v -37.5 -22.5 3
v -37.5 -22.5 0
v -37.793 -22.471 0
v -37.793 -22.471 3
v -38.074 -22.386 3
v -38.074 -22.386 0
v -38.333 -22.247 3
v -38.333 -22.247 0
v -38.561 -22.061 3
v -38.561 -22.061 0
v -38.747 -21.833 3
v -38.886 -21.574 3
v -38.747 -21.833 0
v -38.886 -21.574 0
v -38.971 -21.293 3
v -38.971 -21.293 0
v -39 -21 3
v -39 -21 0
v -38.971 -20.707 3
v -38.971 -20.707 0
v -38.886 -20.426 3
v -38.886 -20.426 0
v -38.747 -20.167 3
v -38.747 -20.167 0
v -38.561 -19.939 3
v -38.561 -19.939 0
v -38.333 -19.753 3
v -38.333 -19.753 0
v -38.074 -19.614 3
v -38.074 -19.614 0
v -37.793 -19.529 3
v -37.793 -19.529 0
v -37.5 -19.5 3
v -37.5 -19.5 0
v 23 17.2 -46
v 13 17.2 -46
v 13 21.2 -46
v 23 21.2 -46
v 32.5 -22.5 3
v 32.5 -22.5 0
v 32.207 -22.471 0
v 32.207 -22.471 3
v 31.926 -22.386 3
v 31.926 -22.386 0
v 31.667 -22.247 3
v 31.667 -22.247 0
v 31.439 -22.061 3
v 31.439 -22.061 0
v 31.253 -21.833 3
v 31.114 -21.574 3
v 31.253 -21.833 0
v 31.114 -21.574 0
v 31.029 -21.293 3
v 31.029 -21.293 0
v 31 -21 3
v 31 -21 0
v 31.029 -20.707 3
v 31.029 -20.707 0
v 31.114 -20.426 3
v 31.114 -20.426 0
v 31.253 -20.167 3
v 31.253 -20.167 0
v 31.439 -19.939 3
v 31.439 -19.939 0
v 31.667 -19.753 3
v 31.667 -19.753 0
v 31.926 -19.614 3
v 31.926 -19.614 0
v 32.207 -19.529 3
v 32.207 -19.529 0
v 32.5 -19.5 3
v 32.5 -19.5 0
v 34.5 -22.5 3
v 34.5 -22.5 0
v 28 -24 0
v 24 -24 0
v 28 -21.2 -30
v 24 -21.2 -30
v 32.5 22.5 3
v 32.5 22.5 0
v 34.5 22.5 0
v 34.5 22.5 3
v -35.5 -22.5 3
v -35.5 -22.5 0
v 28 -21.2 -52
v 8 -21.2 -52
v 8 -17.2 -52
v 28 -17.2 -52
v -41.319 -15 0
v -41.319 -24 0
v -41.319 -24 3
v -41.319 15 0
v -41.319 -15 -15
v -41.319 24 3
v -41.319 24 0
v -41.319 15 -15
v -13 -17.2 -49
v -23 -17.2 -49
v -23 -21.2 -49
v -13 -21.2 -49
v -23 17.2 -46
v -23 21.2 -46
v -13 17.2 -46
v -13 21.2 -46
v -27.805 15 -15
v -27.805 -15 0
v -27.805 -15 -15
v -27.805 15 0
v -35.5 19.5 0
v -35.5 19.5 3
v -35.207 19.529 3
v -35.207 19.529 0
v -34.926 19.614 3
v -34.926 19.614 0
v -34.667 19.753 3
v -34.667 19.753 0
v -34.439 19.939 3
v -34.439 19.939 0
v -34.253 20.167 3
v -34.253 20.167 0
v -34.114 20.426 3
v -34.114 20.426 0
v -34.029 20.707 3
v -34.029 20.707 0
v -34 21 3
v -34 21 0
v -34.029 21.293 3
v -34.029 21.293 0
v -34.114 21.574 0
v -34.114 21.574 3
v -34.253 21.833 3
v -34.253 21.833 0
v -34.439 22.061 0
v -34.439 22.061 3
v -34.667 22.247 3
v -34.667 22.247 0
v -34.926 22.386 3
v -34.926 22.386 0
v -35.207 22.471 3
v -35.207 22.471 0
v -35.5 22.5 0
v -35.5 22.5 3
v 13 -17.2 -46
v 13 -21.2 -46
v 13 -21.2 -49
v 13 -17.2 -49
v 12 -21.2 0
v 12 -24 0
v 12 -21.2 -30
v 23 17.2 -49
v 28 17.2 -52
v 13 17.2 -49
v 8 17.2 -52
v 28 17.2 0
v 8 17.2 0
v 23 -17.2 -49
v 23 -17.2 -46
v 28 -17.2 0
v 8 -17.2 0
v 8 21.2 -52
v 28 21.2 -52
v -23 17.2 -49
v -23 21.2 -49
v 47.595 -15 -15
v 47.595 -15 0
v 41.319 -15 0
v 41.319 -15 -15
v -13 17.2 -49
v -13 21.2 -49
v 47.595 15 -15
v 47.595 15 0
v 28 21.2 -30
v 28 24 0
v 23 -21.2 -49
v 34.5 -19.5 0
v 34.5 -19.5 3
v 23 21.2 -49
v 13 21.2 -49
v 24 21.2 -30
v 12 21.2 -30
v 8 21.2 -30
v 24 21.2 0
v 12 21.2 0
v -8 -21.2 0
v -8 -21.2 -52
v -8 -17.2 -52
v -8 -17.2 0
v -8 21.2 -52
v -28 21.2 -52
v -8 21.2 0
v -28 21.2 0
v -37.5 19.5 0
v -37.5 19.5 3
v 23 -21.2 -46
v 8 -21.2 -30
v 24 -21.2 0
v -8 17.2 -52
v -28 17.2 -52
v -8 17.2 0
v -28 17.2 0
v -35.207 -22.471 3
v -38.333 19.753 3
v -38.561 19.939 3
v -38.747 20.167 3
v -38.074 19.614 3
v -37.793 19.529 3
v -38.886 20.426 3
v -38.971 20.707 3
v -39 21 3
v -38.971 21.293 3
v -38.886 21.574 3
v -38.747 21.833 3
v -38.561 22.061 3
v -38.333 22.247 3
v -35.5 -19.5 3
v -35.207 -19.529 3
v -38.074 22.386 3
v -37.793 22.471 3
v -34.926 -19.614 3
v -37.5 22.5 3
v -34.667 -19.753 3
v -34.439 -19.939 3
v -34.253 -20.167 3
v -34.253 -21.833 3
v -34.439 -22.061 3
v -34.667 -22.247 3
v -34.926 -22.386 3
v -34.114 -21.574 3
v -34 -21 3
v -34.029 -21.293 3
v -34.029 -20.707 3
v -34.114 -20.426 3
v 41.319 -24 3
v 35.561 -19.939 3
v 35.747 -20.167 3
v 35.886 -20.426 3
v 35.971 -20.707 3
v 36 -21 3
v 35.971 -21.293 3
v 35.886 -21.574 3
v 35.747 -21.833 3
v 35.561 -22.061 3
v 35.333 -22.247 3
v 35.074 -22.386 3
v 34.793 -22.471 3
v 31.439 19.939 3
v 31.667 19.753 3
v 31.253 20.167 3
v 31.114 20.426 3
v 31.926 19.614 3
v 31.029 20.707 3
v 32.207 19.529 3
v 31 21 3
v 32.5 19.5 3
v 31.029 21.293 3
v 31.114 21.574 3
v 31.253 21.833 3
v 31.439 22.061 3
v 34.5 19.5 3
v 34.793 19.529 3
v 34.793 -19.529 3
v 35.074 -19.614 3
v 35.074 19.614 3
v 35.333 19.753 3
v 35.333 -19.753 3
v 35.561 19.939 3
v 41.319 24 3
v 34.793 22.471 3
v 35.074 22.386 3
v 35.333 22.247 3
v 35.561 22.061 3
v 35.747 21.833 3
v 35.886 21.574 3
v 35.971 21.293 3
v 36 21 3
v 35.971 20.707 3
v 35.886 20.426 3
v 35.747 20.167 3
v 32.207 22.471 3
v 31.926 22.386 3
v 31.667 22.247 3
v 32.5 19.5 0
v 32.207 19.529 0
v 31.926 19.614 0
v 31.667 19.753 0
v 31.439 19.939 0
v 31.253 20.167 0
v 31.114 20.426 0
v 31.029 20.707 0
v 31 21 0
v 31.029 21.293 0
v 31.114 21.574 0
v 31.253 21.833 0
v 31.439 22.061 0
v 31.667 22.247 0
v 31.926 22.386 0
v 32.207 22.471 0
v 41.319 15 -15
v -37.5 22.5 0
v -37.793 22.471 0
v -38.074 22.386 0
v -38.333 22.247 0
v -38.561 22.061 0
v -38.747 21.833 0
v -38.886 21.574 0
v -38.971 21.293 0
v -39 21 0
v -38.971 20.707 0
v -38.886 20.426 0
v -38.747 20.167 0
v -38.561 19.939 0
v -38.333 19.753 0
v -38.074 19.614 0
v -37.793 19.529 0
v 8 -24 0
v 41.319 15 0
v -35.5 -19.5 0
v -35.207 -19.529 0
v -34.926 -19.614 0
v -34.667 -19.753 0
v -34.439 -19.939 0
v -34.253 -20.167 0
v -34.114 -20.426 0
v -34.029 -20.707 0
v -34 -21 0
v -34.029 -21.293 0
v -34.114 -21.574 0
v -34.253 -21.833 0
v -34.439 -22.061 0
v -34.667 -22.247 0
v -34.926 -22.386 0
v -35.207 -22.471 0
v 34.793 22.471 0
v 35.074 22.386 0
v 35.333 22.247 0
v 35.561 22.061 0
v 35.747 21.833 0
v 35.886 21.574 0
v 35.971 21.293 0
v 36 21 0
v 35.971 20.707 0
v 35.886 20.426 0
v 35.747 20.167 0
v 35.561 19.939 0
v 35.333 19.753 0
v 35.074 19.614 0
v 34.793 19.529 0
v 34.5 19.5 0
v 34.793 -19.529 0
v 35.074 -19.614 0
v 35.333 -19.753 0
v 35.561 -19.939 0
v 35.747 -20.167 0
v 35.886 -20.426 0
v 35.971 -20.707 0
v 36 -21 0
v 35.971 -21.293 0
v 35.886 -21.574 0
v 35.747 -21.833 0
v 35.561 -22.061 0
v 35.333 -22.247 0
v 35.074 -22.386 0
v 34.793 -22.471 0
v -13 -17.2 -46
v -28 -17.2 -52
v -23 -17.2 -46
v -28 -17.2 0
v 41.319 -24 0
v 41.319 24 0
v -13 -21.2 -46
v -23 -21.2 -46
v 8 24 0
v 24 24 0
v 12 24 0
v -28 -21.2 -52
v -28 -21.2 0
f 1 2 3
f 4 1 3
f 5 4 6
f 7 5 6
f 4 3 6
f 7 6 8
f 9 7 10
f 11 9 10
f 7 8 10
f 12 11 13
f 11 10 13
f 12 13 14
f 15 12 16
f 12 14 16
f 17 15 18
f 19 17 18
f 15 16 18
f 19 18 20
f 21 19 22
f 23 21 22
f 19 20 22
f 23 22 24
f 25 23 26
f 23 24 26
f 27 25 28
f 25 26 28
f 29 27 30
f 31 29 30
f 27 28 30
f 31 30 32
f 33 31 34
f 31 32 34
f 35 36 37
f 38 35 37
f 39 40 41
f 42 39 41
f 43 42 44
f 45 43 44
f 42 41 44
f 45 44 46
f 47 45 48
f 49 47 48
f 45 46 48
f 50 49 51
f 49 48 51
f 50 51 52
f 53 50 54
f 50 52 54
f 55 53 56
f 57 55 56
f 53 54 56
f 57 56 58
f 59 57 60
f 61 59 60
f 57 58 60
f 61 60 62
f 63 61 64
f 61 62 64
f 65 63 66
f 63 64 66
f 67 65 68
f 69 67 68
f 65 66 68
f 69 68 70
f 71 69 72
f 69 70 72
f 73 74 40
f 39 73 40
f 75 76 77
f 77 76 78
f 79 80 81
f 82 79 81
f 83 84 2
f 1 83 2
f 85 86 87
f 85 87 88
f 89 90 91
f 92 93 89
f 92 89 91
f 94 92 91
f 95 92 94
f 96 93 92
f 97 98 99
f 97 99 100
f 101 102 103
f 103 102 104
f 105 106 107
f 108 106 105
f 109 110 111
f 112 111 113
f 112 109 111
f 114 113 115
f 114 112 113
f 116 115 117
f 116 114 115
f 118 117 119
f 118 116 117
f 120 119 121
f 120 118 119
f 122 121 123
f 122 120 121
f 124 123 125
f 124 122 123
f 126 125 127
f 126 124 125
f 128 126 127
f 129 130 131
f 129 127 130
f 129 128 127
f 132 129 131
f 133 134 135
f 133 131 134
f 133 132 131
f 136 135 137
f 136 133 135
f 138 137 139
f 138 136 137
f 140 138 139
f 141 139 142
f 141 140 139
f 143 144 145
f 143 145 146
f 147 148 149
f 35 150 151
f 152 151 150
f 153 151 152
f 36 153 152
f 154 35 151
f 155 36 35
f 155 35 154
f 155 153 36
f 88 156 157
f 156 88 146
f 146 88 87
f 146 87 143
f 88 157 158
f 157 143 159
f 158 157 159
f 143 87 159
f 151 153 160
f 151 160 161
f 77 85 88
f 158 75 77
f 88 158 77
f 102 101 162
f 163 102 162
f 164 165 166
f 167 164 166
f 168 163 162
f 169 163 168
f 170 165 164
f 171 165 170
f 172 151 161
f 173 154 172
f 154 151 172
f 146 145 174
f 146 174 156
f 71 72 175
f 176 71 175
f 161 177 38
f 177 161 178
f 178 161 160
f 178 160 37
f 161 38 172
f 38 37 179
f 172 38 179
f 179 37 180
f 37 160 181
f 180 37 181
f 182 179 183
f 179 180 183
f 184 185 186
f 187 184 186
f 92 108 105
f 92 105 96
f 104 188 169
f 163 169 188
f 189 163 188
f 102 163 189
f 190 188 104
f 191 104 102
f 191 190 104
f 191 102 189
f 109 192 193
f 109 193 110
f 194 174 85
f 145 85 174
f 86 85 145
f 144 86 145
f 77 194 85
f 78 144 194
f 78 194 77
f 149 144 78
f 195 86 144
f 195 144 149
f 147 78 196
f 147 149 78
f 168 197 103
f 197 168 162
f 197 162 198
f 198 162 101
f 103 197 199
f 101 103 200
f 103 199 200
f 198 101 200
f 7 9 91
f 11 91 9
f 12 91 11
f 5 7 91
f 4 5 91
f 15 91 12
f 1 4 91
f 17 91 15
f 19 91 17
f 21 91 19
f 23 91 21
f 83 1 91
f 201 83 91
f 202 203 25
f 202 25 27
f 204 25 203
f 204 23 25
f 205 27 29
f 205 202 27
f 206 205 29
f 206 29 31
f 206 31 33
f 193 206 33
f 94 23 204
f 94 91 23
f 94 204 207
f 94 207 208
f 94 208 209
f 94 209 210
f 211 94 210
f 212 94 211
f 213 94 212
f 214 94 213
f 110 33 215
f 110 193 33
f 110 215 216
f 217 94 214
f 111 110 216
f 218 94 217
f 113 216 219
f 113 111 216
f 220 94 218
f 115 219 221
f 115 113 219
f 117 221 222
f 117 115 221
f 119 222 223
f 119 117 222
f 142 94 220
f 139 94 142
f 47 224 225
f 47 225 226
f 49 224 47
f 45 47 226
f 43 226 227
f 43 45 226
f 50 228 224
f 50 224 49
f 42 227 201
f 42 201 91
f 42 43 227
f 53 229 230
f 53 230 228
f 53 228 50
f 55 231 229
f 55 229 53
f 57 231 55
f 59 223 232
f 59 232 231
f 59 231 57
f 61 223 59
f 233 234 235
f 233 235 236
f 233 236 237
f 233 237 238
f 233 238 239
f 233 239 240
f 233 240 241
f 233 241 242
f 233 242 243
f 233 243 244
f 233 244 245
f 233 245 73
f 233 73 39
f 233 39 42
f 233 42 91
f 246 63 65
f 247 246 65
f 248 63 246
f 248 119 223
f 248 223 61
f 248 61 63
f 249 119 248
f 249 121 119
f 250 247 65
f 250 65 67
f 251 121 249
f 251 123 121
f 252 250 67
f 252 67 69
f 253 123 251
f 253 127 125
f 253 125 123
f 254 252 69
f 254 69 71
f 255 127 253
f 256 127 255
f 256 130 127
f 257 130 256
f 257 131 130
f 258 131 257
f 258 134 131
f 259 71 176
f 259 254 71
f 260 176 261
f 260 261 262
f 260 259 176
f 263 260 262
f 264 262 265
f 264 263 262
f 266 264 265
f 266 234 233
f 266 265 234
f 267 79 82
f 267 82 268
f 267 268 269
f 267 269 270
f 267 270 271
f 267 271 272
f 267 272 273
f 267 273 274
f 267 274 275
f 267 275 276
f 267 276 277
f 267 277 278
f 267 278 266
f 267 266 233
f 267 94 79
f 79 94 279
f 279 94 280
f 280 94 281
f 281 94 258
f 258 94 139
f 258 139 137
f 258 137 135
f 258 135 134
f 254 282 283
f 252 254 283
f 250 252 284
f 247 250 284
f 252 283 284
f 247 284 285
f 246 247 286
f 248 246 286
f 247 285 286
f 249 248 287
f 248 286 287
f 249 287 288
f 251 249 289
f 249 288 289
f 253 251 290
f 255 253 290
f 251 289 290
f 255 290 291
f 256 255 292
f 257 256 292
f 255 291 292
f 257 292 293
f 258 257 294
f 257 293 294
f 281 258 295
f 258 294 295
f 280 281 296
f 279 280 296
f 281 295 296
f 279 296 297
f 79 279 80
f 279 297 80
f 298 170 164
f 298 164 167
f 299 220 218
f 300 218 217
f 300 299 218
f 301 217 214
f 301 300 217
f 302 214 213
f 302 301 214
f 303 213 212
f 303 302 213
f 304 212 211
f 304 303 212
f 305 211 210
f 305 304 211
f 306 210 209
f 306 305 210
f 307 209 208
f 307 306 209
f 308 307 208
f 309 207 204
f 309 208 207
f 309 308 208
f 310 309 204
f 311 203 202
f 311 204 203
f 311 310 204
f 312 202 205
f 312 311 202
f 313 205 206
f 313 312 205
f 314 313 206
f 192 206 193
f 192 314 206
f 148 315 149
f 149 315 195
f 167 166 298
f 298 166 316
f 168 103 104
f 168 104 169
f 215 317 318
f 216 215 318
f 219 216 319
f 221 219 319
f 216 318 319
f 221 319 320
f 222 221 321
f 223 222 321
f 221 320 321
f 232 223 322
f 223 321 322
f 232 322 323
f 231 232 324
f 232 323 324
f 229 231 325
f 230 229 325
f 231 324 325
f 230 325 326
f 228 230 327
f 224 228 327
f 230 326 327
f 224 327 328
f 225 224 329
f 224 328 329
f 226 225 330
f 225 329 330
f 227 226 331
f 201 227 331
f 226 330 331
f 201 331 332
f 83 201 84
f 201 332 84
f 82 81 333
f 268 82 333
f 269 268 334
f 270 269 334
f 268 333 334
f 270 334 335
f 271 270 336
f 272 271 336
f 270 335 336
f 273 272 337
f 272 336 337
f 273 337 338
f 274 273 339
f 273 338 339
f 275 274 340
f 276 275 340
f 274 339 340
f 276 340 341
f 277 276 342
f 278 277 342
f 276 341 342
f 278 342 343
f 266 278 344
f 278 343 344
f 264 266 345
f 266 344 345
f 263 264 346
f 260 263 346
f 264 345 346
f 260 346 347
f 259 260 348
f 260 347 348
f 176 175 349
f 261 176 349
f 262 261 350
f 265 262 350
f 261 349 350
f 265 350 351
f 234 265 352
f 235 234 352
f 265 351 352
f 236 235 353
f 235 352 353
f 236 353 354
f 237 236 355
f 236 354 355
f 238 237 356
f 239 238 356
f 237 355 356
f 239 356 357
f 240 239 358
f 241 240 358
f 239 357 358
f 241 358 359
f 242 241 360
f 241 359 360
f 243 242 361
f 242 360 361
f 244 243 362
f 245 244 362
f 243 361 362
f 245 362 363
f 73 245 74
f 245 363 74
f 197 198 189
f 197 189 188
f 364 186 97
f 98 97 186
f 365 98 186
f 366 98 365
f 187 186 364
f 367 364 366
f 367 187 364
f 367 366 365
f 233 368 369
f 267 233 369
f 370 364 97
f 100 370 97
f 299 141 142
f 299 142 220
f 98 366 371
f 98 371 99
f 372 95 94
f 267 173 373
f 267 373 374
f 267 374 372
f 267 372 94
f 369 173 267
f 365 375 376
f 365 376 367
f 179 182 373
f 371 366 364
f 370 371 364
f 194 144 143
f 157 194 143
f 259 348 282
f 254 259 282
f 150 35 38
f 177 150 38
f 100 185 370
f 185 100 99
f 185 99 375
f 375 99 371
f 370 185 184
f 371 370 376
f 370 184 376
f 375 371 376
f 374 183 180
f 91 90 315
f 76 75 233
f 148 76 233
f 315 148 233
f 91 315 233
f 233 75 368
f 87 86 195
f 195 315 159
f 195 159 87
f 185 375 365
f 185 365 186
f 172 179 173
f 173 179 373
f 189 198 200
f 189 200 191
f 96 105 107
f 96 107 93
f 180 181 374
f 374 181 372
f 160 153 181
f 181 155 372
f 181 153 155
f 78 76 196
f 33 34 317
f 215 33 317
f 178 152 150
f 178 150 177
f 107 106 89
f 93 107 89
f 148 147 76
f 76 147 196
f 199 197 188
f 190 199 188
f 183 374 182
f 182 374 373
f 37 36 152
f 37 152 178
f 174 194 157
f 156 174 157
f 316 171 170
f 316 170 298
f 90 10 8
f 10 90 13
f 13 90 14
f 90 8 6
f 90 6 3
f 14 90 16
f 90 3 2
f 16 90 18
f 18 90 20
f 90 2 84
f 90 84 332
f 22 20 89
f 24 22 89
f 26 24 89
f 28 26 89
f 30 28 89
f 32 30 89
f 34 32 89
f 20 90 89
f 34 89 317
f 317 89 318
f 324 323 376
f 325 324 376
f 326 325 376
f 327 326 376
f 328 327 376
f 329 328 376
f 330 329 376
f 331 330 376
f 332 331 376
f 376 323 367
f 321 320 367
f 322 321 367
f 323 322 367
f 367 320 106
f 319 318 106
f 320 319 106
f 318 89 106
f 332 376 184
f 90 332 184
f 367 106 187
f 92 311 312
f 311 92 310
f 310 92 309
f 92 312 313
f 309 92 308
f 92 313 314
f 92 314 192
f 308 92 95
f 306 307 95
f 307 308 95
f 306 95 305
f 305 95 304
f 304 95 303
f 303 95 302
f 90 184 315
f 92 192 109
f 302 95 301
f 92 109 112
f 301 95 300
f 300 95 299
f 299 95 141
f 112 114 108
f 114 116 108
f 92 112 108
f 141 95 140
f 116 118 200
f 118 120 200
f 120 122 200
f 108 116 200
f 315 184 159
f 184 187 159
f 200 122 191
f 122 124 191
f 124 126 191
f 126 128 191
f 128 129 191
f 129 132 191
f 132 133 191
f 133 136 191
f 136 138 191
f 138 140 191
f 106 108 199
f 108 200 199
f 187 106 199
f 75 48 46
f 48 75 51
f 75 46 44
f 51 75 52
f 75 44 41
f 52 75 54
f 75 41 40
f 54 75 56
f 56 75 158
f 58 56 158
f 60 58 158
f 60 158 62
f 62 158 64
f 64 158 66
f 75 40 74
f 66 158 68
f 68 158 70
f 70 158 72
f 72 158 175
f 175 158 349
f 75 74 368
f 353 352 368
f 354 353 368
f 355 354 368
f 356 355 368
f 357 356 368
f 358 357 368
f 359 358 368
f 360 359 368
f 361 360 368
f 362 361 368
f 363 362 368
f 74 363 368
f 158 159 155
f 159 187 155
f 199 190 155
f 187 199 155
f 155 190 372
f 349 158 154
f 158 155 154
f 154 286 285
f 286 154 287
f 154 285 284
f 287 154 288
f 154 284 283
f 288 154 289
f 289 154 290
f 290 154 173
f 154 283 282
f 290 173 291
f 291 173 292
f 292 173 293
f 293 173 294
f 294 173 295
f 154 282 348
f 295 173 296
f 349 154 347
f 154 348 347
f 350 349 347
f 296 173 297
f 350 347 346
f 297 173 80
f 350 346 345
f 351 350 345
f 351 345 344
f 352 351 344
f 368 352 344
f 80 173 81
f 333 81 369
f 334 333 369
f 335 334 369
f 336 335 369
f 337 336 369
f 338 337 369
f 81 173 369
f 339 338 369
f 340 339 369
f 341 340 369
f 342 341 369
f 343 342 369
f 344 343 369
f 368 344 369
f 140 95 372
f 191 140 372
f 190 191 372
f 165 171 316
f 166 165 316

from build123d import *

# Parameters (mm, degrees)
SKETCH_2_W               = 82.637997944
SKETCH_2_H               = 48
EXTRUDE_1_DEPTH          = 3
SKETCH_3_W               = 20
SKETCH_3_H               = 4
EXTRUDE_2_DEPTH          = 53
SKETCH_4_W               = 13.514067067
SKETCH_4_H               = 30
EXTRUDE_3_DEPTH          = 15
SKETCH_5_W               = 6.276069123
SKETCH_5_H               = 30
EXTRUDE_4_DEPTH          = 15
SKETCH_6_W               = 10
SKETCH_6_H               = 3
CUT_EXTRUDE_1_DEPTH      = 83.290525013
MIRROR_START             = 8
MIRROR_2_OUTLINE_W       = 4
MIRROR_2_OUTLINE_H       = 46
MIRROR_2_OUTLINE_H_2     = 4
MIRROR_2_DEPTH           = 20
MIRROR_2_2_OUTLINE_W     = 4
MIRROR_2_2_OUTLINE_H     = 3
MIRROR_2_2_DEPTH         = 4
MIRROR_START_2           = 24
MIRROR_2_3_OUTLINE_W     = 4
MIRROR_2_3_OUTLINE_H     = 3
MIRROR_2_3_DEPTH         = 4
MIRROR_START_3           = 12
MIRROR_2_4_OUTLINE_W     = 4
MIRROR_2_4_OUTLINE_H     = 3
MIRROR_2_4_DEPTH         = 1
MIRROR_START_4           = 23
MIRROR_2_5_OUTLINE_W     = 4
MIRROR_2_5_OUTLINE_H     = 3
MIRROR_2_5_DEPTH         = 1
CUT_EXTRUDE_3_DEPTH      = 15
CUT_EXTRUDE_4_DEPTH      = 85.364272693
CUT_EXTRUDE_4_DEPTH_BACK = 85.364272693
SKETCH_10_W              = 56
SKETCH_10_H              = 1


with BuildPart() as part:
    # 草图2 → 凸台-拉伸1 (new body)
    with BuildSketch(Plane.XY):
        Rectangle(SKETCH_2_W, SKETCH_2_H)
    extrude(amount=EXTRUDE_1_DEPTH)

    # 草图3 → 凸台-拉伸2 (add)
    with BuildSketch(Plane(origin=(0, 0, 0), x_dir=(-1, 0, 0), z_dir=(0, 0, -1))):
        with Locations((18, 19.2)):
            Rectangle(SKETCH_3_W, SKETCH_3_H)
        with Locations((18, -19.2)):
            Rectangle(SKETCH_3_W, SKETCH_3_H)
    extrude(amount=EXTRUDE_2_DEPTH)

    # 草图4 → 凸台-拉伸3 (add)
    with BuildSketch(Plane(origin=(0, 0, 0), x_dir=(-1, 0, 0), z_dir=(0, 0, -1))):
        with Locations((34.561965439, 0)):
            Rectangle(SKETCH_4_W, SKETCH_4_H)
    extrude(amount=EXTRUDE_3_DEPTH)

    # 草图6 → 切除-拉伸1 (cut, symmetric)
    with BuildSketch(Plane(origin=(0, -17.2, 0), x_dir=(1, 0, 0), z_dir=(0, 1, 0))):
        with Locations((-18, 47.5)):
            Rectangle(SKETCH_6_W, SKETCH_6_H)
    extrude(amount=CUT_EXTRUDE_1_DEPTH, both=True, mode=Mode.SUBTRACT)

    # 镜向2: read off the stored shape, not the designer's step
    # 镜向2 outline → 镜向2 (add)
    with BuildSketch(Plane.YZ.offset(MIRROR_START)):
        with Locations((19.2, -23)):
            Rectangle(MIRROR_2_OUTLINE_W, MIRROR_2_OUTLINE_H)
        with Locations((-19.2, -23)):
            Rectangle(MIRROR_2_OUTLINE_W, MIRROR_2_OUTLINE_H)
        with Locations((19.2, -51)):
            Rectangle(MIRROR_2_OUTLINE_W, MIRROR_2_OUTLINE_H_2)
        with Locations((-19.2, -51)):
            Rectangle(MIRROR_2_OUTLINE_W, MIRROR_2_OUTLINE_H_2)
    extrude(amount=MIRROR_2_DEPTH)

    # Mirror 2 2 outline → Mirror 2 2 (add)
    with BuildSketch(Plane.YZ.offset(MIRROR_START)):
        with Locations((19.2, -47.5)):
            Rectangle(MIRROR_2_2_OUTLINE_W, MIRROR_2_2_OUTLINE_H)
        Polygon((24, 0), (21.2, 0), (21.2, -30), align=None)
        with Locations((-19.2, -47.5)):
            Rectangle(MIRROR_2_2_OUTLINE_W, MIRROR_2_2_OUTLINE_H)
        Polygon((-21.2, -30), (-21.2, 0), (-24, 0), align=None)
    extrude(amount=MIRROR_2_2_DEPTH)

    # Mirror 2 3 outline → Mirror 2 3 (add)
    with BuildSketch(Plane.YZ.offset(MIRROR_START_2)):
        with Locations((19.2, -47.5)):
            Rectangle(MIRROR_2_3_OUTLINE_W, MIRROR_2_3_OUTLINE_H)
        Polygon((24, 0), (21.2, 0), (21.2, -30), align=None)
        with Locations((-19.2, -47.5)):
            Rectangle(MIRROR_2_3_OUTLINE_W, MIRROR_2_3_OUTLINE_H)
        Polygon((-21.2, -30), (-21.2, 0), (-24, 0), align=None)
    extrude(amount=MIRROR_2_3_DEPTH)

    # Mirror 2 4 outline → Mirror 2 4 (add)
    with BuildSketch(Plane.YZ.offset(MIRROR_START_3)):
        with Locations((19.2, -47.5)):
            Rectangle(MIRROR_2_4_OUTLINE_W, MIRROR_2_4_OUTLINE_H)
        with Locations((-19.2, -47.5)):
            Rectangle(MIRROR_2_4_OUTLINE_W, MIRROR_2_4_OUTLINE_H)
    extrude(amount=MIRROR_2_4_DEPTH)

    # Mirror 2 5 outline → Mirror 2 5 (add)
    with BuildSketch(Plane.YZ.offset(MIRROR_START_4)):
        with Locations((19.2, -47.5)):
            Rectangle(MIRROR_2_5_OUTLINE_W, MIRROR_2_5_OUTLINE_H)
        with Locations((-19.2, -47.5)):
            Rectangle(MIRROR_2_5_OUTLINE_W, MIRROR_2_5_OUTLINE_H)
    extrude(amount=MIRROR_2_5_DEPTH)

    # 草图8 → 切除-拉伸3 (cut)
    with BuildSketch(Plane(origin=(0, 0, 0), x_dir=(-1, 0, 0), z_dir=(0, 0, -1))):
        with BuildLine():
            Line((37.5, -19.5), (35.5, -19.5))
            ThreePointArc((35.5, -19.5), (34, -21), (35.5, -22.5))
            Line((35.5, -22.5), (37.5, -22.5))
            ThreePointArc((37.5, -22.5), (39, -21), (37.5, -19.5))
        make_face()
        with BuildLine():
            Line((-32.5, -19.5), (-34.5, -19.5))
            ThreePointArc((-34.5, -19.5), (-36, -21), (-34.5, -22.5))
            Line((-34.5, -22.5), (-32.5, -22.5))
            ThreePointArc((-32.5, -22.5), (-31, -21), (-32.5, -19.5))
        make_face()
        with BuildLine():
            Line((-32.5, 22.5), (-34.5, 22.5))
            ThreePointArc((-34.5, 22.5), (-36, 21), (-34.5, 19.5))
            Line((-34.5, 19.5), (-32.5, 19.5))
            ThreePointArc((-32.5, 19.5), (-31, 21), (-32.5, 22.5))
        make_face()
        with BuildLine():
            Line((37.5, 19.5), (35.5, 19.5))
            ThreePointArc((35.5, 19.5), (34, 21), (35.5, 22.5))
            Line((35.5, 22.5), (37.5, 22.5))
            ThreePointArc((37.5, 22.5), (39, 21), (37.5, 19.5))
        make_face()
    extrude(amount=-CUT_EXTRUDE_3_DEPTH, mode=Mode.SUBTRACT)

    # 草图10 → 切除-拉伸4 (cut, two sides: drawn at the far end of the back side and taken through both)
    with BuildSketch(Plane(origin=(0, 21.2, 0), x_dir=(1, 0, 0), z_dir=(0, 1, 0)).offset(-CUT_EXTRUDE_4_DEPTH_BACK)):
        with Locations((0, 52.5)):
            Rectangle(SKETCH_10_W, SKETCH_10_H)
    extrude(amount=CUT_EXTRUDE_4_DEPTH + CUT_EXTRUDE_4_DEPTH_BACK, mode=Mode.SUBTRACT)


with BuildPart() as body_2:
    # 草图5 → 凸台-拉伸4 (new body)
    with BuildSketch(Plane(origin=(0, 0, 0), x_dir=(-1, 0, 0), z_dir=(0, 0, -1))):
        with Locations((-44.457033534, 0)):
            Rectangle(SKETCH_5_W, SKETCH_5_H)
    extrude(amount=EXTRUDE_4_DEPTH)


solid = Compound([part.part, body_2.part])
